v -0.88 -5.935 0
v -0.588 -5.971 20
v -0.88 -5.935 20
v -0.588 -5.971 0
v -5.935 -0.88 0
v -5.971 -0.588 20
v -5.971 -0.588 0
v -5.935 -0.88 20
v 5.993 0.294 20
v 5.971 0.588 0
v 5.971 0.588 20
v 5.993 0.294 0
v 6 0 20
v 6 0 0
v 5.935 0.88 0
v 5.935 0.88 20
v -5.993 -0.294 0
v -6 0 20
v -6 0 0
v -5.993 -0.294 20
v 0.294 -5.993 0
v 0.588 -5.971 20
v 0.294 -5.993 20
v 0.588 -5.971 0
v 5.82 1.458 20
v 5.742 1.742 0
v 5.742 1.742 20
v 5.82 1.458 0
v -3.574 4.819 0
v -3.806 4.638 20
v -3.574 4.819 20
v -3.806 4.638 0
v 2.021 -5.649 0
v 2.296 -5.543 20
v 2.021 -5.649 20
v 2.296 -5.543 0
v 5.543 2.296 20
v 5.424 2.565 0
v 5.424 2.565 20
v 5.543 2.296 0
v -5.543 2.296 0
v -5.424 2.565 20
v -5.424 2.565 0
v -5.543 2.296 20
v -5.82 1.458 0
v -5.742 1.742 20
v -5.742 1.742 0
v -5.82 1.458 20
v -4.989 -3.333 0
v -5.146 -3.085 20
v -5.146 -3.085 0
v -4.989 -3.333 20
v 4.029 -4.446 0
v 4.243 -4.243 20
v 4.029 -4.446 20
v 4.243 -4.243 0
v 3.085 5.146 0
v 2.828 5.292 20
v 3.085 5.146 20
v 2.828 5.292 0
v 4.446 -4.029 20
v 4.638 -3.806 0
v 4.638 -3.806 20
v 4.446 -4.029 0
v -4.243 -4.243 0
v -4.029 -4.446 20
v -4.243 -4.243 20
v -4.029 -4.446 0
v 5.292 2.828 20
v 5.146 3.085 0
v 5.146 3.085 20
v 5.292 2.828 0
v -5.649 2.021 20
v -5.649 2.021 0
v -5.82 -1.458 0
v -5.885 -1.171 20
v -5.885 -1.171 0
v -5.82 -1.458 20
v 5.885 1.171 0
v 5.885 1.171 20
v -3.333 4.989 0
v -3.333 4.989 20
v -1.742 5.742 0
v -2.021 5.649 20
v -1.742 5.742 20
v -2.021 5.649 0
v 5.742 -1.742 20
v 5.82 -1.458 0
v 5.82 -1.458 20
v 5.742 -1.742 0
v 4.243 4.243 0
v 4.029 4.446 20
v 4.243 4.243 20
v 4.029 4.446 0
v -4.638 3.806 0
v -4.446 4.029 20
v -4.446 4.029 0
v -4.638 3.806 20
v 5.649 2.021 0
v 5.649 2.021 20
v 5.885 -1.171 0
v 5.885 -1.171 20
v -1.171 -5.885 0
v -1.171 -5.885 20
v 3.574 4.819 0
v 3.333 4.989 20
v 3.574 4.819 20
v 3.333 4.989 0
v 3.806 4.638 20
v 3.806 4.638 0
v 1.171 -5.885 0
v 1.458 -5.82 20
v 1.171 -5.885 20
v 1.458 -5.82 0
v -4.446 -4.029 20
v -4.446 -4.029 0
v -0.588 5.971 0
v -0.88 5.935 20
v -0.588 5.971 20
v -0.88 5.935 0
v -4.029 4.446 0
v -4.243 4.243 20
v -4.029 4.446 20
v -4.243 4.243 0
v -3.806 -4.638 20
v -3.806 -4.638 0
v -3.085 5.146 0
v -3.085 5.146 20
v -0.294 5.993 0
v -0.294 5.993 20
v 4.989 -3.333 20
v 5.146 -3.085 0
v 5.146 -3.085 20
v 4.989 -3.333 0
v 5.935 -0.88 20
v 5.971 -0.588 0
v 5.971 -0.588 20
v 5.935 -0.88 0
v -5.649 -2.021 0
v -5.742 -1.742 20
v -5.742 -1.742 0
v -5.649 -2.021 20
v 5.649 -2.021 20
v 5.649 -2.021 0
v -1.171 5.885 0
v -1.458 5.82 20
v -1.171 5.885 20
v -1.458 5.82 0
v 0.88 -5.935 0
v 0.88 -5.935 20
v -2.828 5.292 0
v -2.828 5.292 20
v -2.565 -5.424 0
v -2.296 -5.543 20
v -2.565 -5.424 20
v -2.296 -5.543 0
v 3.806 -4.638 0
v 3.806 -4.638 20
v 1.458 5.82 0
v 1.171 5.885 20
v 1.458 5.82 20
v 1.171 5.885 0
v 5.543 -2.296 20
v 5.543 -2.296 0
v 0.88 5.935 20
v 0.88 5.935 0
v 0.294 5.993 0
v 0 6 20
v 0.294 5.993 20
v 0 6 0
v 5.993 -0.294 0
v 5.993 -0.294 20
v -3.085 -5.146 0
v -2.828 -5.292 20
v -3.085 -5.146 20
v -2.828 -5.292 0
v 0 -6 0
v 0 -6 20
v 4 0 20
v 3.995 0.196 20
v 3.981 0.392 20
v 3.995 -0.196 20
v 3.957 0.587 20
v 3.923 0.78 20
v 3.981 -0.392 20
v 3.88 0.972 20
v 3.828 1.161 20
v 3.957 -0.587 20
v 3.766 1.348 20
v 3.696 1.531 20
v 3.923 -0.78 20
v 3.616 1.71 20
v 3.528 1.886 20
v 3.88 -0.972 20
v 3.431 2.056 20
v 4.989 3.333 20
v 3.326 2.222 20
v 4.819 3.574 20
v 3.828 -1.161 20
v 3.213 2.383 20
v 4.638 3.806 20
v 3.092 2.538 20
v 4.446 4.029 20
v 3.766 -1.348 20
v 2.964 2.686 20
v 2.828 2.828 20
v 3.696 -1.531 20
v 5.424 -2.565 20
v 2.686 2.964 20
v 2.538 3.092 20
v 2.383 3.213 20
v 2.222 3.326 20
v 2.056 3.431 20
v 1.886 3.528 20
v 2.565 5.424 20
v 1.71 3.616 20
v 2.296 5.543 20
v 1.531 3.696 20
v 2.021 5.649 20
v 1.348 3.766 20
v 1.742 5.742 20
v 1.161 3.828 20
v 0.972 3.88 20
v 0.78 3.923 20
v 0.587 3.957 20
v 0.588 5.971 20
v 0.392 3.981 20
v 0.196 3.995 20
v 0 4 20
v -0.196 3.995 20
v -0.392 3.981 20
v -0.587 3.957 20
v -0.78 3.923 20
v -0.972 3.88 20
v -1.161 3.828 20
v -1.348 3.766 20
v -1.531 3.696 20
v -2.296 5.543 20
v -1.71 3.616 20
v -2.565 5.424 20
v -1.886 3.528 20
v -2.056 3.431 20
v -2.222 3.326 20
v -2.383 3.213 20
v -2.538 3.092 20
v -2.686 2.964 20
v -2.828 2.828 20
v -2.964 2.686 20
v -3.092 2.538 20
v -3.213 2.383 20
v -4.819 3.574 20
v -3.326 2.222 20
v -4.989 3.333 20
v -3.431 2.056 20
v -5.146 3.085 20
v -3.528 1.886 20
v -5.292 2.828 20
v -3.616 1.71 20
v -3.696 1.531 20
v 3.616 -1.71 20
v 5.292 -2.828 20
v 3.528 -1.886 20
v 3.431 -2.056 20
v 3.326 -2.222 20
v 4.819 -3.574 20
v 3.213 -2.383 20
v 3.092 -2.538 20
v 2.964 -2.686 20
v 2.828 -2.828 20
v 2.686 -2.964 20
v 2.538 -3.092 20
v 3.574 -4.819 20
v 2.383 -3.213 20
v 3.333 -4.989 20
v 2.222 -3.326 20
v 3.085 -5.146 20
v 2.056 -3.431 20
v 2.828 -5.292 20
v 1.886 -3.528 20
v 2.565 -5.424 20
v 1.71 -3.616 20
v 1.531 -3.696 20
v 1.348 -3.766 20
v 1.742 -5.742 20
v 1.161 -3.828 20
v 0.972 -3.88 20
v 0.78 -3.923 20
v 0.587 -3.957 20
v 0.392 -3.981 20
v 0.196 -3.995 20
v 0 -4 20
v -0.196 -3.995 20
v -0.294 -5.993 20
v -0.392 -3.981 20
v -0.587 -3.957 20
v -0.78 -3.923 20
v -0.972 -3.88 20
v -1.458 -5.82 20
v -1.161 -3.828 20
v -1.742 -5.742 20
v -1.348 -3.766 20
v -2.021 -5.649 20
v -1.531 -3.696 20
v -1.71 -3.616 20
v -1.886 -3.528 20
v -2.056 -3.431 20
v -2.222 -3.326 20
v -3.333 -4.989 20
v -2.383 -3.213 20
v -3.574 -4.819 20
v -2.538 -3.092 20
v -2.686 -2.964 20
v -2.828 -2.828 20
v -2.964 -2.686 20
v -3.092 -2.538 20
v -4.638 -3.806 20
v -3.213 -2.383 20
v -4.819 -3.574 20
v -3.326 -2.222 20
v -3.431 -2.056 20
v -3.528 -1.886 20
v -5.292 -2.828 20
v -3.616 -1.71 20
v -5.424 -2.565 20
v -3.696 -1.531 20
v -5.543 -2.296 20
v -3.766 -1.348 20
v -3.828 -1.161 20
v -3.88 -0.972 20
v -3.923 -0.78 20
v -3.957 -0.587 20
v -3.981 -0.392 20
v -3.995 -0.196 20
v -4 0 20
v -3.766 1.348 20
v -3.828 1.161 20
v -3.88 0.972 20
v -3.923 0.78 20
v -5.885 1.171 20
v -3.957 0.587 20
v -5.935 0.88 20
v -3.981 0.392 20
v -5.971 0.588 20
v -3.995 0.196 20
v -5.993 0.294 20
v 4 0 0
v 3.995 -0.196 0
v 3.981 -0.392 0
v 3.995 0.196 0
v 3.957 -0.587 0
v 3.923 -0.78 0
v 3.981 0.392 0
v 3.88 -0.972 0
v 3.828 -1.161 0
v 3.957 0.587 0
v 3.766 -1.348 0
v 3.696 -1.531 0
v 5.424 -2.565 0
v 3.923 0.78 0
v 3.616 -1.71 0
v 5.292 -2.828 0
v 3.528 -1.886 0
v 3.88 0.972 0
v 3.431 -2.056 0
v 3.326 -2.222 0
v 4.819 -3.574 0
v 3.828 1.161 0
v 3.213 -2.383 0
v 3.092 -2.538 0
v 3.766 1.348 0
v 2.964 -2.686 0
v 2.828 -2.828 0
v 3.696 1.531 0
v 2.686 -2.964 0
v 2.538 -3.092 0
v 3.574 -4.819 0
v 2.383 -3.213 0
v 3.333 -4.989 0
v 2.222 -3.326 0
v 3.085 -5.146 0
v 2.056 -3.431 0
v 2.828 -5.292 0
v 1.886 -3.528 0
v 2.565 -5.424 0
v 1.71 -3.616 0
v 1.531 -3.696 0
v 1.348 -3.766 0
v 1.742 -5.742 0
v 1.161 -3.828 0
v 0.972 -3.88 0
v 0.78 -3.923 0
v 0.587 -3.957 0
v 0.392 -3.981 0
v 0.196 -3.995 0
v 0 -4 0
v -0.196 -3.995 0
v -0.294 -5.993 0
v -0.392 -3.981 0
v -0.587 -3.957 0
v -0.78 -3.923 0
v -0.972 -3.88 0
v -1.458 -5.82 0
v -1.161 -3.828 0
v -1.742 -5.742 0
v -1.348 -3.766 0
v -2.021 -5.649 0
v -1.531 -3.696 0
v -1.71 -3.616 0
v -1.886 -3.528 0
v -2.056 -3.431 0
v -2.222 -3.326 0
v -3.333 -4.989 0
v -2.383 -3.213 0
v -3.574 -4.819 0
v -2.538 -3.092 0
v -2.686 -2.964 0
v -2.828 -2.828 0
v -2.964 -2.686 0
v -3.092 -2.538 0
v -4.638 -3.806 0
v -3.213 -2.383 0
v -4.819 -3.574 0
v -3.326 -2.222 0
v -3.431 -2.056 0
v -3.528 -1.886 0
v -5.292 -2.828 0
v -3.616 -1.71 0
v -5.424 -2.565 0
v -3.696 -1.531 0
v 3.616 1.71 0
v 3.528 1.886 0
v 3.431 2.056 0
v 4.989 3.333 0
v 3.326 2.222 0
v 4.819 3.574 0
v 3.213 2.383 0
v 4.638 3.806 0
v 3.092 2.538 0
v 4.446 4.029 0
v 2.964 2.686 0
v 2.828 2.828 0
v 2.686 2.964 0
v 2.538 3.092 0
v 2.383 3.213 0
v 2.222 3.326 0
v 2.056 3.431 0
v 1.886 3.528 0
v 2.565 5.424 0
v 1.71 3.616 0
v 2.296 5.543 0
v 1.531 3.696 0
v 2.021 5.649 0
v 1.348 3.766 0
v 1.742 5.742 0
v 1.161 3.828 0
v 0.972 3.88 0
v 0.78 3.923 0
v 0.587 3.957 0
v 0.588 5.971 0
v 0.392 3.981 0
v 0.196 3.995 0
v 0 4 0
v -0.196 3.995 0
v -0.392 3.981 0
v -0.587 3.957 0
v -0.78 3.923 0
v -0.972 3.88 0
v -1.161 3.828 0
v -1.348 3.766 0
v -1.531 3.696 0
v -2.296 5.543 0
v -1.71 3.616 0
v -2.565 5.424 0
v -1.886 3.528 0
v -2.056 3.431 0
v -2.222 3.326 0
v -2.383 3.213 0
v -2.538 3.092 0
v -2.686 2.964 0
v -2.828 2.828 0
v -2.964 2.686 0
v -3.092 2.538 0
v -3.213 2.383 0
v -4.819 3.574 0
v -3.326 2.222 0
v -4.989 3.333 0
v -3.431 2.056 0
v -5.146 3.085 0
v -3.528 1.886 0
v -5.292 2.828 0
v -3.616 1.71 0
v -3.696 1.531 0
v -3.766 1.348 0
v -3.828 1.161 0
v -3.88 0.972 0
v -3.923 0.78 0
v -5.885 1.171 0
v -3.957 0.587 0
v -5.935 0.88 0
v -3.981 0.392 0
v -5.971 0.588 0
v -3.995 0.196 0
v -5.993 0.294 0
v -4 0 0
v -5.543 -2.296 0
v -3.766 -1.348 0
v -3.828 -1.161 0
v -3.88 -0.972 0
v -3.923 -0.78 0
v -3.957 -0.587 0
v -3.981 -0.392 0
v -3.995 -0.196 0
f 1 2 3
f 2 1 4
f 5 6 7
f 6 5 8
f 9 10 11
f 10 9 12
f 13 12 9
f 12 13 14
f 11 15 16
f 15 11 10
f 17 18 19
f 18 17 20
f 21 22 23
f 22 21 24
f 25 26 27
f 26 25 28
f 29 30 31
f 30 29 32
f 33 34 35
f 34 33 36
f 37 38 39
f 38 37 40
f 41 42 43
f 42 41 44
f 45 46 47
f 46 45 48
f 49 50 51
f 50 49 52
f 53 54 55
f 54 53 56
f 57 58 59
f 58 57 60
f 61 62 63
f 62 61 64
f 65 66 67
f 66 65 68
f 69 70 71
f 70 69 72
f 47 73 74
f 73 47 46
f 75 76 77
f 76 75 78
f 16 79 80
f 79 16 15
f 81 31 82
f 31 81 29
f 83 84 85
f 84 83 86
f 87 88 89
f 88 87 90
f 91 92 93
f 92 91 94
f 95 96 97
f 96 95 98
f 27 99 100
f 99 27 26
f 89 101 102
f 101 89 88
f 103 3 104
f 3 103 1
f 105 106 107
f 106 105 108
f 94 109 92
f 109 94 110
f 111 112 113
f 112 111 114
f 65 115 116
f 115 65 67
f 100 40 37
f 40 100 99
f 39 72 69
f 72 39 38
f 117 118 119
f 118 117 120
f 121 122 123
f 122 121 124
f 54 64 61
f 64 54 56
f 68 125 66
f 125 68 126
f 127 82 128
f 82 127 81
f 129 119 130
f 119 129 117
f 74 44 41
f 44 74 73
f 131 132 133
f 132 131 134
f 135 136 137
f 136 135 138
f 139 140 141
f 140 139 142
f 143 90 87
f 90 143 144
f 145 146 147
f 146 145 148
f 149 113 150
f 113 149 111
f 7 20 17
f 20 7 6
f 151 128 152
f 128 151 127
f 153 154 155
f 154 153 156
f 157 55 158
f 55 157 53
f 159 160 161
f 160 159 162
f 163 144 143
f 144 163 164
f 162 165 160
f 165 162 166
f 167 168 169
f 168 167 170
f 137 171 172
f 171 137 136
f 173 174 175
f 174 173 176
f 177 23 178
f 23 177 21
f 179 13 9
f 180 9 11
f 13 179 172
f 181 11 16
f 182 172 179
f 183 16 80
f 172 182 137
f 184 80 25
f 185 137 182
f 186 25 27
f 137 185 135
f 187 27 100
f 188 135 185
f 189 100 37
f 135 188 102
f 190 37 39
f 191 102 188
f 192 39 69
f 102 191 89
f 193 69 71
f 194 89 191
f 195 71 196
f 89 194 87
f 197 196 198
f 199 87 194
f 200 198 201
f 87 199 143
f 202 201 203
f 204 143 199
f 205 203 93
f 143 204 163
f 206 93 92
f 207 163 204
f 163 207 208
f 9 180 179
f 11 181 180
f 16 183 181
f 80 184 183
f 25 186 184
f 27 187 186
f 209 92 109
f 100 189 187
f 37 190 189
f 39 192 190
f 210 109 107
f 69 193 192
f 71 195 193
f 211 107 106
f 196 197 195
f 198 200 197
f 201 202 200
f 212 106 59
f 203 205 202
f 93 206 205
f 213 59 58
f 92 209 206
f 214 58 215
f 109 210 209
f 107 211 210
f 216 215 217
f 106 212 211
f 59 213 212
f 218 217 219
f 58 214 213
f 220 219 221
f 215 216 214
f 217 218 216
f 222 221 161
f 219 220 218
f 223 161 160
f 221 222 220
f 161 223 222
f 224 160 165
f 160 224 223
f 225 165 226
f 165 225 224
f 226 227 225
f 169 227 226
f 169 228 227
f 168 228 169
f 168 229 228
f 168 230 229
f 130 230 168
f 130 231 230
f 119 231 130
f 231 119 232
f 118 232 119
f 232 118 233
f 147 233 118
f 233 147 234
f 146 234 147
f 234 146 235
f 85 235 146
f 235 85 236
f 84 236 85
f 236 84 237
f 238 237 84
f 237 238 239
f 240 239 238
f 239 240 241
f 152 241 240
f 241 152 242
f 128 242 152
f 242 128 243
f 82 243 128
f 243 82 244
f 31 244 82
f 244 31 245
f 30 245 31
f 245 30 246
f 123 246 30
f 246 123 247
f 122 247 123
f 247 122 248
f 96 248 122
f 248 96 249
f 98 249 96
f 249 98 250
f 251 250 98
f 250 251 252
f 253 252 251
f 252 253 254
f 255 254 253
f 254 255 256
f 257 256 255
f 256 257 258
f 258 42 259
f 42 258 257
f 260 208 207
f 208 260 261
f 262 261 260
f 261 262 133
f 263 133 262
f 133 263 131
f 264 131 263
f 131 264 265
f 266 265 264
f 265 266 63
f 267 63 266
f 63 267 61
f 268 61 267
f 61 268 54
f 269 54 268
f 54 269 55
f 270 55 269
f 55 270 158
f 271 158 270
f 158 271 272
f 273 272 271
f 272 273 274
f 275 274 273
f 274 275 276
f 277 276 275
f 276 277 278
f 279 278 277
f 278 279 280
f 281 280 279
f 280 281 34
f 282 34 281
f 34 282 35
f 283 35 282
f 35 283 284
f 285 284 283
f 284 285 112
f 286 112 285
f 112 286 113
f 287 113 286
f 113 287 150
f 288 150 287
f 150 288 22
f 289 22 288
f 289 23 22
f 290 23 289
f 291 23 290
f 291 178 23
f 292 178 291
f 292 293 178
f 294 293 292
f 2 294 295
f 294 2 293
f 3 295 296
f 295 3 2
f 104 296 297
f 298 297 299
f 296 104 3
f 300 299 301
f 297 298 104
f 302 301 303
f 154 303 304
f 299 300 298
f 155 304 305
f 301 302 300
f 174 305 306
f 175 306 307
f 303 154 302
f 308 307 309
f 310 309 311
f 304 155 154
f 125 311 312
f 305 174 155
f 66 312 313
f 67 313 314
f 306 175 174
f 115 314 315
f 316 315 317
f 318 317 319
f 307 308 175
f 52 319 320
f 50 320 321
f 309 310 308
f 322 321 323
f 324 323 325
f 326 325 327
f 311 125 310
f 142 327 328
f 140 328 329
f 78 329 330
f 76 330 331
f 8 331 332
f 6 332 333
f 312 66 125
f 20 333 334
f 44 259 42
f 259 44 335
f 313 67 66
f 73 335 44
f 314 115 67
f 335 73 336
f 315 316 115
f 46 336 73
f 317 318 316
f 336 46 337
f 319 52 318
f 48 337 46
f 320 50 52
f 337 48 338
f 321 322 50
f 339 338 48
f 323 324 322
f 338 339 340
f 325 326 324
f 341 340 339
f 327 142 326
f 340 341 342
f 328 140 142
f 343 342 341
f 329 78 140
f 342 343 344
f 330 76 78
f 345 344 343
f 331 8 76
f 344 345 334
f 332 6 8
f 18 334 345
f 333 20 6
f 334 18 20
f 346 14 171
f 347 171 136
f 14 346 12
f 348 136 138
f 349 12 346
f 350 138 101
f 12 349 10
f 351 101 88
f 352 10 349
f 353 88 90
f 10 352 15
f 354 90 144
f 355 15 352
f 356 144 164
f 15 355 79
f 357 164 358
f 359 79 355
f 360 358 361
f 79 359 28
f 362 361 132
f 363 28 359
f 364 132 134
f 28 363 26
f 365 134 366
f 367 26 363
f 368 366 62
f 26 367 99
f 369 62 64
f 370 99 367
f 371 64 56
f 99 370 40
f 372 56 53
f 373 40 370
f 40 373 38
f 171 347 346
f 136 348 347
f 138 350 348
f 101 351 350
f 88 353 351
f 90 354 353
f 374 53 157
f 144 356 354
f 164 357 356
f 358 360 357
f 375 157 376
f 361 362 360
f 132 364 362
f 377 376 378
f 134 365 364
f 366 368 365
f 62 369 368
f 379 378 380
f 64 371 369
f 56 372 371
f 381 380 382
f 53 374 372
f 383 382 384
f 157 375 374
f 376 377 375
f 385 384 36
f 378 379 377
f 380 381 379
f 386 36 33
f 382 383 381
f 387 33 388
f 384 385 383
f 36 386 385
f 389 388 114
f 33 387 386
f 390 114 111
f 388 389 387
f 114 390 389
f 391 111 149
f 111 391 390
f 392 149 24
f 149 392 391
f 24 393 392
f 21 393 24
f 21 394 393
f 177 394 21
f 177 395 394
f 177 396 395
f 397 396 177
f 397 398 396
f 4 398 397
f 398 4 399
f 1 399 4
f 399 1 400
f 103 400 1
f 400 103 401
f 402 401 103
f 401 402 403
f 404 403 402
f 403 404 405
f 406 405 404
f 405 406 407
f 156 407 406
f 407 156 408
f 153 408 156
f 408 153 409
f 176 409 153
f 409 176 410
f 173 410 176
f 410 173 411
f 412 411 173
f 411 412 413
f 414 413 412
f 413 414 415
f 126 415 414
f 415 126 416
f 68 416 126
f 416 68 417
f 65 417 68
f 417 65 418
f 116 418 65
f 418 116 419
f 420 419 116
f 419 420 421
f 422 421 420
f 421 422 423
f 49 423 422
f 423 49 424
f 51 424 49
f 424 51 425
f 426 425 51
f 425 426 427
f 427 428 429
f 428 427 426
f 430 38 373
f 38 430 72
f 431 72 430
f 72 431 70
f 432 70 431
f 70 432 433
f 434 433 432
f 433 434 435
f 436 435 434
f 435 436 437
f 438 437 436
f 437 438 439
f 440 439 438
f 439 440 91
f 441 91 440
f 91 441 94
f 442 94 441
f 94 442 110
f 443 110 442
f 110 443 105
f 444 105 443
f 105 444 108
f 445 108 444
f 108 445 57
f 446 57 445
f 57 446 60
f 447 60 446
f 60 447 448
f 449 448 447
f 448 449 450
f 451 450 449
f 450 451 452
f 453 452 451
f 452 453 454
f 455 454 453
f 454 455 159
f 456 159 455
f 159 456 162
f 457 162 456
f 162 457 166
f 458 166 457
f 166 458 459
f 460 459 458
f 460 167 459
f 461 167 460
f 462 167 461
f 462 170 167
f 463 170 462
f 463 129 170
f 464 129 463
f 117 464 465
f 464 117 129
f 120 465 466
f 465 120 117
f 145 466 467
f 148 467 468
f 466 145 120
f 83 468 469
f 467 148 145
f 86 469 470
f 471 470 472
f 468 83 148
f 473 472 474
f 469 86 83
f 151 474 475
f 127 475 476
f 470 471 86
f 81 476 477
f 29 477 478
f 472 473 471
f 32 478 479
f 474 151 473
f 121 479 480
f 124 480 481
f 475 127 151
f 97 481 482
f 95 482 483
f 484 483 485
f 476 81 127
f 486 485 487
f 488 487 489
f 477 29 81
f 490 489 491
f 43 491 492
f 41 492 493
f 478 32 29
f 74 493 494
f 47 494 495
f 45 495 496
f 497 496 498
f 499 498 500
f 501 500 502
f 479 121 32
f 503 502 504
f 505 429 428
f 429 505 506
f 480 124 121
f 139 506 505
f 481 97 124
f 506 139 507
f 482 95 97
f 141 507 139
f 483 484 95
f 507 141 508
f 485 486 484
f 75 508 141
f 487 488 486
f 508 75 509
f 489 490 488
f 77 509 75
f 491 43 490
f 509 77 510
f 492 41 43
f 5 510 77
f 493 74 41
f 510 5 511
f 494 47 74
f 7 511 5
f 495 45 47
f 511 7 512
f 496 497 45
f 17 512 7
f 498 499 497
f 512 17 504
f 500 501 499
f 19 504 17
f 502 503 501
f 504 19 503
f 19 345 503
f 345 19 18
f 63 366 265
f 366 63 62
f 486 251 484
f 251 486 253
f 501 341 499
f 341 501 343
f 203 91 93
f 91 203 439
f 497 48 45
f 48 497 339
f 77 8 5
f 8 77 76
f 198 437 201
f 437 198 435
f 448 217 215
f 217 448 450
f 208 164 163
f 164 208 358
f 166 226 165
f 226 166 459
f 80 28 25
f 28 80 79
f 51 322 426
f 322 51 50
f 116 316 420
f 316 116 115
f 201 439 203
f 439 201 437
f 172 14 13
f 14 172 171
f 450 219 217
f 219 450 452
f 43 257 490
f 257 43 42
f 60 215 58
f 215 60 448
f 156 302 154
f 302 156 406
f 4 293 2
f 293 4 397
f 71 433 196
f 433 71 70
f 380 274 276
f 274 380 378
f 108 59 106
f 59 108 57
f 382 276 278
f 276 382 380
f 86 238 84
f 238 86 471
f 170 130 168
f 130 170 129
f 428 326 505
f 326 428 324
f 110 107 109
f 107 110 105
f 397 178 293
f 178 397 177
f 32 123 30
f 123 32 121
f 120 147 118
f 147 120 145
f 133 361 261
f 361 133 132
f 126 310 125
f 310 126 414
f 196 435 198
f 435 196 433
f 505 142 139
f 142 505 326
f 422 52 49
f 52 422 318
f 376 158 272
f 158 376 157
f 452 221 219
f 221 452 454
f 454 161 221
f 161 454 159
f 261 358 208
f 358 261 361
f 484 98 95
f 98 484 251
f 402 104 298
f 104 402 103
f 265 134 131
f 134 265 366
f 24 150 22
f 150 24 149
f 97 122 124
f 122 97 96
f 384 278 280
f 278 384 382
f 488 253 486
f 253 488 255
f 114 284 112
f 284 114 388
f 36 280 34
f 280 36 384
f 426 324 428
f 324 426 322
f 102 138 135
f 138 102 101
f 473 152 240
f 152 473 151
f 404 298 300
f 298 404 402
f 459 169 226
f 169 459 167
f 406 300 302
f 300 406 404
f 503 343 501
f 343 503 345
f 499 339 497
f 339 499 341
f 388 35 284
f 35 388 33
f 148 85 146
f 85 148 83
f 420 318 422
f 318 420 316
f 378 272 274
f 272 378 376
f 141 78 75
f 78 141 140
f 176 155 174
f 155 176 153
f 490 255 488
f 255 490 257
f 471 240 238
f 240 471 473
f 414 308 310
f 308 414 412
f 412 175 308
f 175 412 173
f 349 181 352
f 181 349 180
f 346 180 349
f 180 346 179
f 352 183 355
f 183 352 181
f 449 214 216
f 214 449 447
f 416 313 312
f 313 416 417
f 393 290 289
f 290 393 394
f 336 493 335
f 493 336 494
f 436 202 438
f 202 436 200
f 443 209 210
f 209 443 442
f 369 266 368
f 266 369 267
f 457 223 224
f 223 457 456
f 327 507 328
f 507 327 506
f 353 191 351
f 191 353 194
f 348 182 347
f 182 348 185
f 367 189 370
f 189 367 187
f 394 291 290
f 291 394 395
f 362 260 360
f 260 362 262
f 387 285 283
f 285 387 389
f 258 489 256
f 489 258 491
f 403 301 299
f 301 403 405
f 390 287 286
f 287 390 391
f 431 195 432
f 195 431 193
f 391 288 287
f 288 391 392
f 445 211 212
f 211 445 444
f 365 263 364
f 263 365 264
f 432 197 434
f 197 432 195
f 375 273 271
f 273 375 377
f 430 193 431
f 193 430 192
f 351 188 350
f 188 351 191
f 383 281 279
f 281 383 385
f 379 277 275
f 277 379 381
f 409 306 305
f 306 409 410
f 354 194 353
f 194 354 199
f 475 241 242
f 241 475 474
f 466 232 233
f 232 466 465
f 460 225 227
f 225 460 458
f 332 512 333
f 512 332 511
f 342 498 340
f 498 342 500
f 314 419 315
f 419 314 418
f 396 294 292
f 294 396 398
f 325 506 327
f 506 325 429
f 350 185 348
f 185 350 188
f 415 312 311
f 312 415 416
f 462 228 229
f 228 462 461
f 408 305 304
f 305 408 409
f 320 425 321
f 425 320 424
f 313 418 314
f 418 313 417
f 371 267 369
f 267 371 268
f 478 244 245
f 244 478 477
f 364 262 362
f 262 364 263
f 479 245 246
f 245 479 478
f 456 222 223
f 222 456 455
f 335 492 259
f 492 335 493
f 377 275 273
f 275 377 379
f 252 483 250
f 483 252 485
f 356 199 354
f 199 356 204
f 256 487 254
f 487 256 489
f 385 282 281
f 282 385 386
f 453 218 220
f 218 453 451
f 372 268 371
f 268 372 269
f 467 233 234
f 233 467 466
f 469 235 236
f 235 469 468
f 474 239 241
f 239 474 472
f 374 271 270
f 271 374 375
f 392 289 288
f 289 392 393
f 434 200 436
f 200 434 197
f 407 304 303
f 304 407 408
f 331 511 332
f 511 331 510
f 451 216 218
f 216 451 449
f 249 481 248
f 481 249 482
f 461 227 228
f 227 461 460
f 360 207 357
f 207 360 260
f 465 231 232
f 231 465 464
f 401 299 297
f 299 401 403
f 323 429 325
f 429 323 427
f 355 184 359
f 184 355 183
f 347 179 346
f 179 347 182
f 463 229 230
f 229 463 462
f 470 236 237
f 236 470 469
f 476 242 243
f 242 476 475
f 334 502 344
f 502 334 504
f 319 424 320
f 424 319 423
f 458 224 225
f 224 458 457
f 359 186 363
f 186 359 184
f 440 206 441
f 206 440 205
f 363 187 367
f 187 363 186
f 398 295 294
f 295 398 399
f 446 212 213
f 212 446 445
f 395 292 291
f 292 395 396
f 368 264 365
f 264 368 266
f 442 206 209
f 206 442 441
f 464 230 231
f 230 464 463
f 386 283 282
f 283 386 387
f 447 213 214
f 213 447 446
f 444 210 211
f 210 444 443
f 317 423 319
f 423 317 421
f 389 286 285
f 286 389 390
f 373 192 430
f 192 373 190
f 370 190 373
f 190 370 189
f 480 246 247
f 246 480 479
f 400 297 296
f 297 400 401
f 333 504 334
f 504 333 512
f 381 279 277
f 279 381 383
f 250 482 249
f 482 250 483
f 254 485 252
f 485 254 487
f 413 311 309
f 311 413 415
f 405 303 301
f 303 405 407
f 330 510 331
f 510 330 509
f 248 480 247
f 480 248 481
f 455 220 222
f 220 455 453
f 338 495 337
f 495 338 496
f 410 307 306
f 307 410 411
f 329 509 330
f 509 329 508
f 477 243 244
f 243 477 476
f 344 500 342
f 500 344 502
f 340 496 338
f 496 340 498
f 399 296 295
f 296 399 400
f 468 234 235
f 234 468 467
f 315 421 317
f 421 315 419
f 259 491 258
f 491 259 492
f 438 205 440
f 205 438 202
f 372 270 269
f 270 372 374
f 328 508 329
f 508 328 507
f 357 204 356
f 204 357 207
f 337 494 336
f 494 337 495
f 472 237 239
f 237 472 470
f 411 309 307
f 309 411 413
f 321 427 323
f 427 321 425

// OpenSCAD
// @mps id=org.mechstudio.sample.plain-bushing version=1.0.0 name="Plain Bushing" description="Simple cylindrical sleeve used to verify the module contract"

/* [Dimensions] */
// @mps-param type=length label="Inner diameter" description="Diameter of the through bore"
inner_diameter = 8; // [0.1:0.1:500]

// @mps-param type=length label="Outer diameter" description="Outside finished diameter"
outer_diameter = 12; // [0.1:0.1:500]

// @mps-param type=length label="Length" description="Overall axial length"
length = 20; // [0.1:0.1:1000]

/* [Hidden] */
$fn = 128;

assert(inner_diameter > 0, "Inner diameter must be positive");
assert(outer_diameter > 0, "Outer diameter must be positive");
assert(length > 0, "Length must be positive");
assert(outer_diameter > inner_diameter, "Outer diameter must exceed inner diameter");

difference() {
    cylinder(d=outer_diameter, h=length);
    translate([0, 0, -0.01]) cylinder(d=inner_diameter, h=length + 0.02);
}
